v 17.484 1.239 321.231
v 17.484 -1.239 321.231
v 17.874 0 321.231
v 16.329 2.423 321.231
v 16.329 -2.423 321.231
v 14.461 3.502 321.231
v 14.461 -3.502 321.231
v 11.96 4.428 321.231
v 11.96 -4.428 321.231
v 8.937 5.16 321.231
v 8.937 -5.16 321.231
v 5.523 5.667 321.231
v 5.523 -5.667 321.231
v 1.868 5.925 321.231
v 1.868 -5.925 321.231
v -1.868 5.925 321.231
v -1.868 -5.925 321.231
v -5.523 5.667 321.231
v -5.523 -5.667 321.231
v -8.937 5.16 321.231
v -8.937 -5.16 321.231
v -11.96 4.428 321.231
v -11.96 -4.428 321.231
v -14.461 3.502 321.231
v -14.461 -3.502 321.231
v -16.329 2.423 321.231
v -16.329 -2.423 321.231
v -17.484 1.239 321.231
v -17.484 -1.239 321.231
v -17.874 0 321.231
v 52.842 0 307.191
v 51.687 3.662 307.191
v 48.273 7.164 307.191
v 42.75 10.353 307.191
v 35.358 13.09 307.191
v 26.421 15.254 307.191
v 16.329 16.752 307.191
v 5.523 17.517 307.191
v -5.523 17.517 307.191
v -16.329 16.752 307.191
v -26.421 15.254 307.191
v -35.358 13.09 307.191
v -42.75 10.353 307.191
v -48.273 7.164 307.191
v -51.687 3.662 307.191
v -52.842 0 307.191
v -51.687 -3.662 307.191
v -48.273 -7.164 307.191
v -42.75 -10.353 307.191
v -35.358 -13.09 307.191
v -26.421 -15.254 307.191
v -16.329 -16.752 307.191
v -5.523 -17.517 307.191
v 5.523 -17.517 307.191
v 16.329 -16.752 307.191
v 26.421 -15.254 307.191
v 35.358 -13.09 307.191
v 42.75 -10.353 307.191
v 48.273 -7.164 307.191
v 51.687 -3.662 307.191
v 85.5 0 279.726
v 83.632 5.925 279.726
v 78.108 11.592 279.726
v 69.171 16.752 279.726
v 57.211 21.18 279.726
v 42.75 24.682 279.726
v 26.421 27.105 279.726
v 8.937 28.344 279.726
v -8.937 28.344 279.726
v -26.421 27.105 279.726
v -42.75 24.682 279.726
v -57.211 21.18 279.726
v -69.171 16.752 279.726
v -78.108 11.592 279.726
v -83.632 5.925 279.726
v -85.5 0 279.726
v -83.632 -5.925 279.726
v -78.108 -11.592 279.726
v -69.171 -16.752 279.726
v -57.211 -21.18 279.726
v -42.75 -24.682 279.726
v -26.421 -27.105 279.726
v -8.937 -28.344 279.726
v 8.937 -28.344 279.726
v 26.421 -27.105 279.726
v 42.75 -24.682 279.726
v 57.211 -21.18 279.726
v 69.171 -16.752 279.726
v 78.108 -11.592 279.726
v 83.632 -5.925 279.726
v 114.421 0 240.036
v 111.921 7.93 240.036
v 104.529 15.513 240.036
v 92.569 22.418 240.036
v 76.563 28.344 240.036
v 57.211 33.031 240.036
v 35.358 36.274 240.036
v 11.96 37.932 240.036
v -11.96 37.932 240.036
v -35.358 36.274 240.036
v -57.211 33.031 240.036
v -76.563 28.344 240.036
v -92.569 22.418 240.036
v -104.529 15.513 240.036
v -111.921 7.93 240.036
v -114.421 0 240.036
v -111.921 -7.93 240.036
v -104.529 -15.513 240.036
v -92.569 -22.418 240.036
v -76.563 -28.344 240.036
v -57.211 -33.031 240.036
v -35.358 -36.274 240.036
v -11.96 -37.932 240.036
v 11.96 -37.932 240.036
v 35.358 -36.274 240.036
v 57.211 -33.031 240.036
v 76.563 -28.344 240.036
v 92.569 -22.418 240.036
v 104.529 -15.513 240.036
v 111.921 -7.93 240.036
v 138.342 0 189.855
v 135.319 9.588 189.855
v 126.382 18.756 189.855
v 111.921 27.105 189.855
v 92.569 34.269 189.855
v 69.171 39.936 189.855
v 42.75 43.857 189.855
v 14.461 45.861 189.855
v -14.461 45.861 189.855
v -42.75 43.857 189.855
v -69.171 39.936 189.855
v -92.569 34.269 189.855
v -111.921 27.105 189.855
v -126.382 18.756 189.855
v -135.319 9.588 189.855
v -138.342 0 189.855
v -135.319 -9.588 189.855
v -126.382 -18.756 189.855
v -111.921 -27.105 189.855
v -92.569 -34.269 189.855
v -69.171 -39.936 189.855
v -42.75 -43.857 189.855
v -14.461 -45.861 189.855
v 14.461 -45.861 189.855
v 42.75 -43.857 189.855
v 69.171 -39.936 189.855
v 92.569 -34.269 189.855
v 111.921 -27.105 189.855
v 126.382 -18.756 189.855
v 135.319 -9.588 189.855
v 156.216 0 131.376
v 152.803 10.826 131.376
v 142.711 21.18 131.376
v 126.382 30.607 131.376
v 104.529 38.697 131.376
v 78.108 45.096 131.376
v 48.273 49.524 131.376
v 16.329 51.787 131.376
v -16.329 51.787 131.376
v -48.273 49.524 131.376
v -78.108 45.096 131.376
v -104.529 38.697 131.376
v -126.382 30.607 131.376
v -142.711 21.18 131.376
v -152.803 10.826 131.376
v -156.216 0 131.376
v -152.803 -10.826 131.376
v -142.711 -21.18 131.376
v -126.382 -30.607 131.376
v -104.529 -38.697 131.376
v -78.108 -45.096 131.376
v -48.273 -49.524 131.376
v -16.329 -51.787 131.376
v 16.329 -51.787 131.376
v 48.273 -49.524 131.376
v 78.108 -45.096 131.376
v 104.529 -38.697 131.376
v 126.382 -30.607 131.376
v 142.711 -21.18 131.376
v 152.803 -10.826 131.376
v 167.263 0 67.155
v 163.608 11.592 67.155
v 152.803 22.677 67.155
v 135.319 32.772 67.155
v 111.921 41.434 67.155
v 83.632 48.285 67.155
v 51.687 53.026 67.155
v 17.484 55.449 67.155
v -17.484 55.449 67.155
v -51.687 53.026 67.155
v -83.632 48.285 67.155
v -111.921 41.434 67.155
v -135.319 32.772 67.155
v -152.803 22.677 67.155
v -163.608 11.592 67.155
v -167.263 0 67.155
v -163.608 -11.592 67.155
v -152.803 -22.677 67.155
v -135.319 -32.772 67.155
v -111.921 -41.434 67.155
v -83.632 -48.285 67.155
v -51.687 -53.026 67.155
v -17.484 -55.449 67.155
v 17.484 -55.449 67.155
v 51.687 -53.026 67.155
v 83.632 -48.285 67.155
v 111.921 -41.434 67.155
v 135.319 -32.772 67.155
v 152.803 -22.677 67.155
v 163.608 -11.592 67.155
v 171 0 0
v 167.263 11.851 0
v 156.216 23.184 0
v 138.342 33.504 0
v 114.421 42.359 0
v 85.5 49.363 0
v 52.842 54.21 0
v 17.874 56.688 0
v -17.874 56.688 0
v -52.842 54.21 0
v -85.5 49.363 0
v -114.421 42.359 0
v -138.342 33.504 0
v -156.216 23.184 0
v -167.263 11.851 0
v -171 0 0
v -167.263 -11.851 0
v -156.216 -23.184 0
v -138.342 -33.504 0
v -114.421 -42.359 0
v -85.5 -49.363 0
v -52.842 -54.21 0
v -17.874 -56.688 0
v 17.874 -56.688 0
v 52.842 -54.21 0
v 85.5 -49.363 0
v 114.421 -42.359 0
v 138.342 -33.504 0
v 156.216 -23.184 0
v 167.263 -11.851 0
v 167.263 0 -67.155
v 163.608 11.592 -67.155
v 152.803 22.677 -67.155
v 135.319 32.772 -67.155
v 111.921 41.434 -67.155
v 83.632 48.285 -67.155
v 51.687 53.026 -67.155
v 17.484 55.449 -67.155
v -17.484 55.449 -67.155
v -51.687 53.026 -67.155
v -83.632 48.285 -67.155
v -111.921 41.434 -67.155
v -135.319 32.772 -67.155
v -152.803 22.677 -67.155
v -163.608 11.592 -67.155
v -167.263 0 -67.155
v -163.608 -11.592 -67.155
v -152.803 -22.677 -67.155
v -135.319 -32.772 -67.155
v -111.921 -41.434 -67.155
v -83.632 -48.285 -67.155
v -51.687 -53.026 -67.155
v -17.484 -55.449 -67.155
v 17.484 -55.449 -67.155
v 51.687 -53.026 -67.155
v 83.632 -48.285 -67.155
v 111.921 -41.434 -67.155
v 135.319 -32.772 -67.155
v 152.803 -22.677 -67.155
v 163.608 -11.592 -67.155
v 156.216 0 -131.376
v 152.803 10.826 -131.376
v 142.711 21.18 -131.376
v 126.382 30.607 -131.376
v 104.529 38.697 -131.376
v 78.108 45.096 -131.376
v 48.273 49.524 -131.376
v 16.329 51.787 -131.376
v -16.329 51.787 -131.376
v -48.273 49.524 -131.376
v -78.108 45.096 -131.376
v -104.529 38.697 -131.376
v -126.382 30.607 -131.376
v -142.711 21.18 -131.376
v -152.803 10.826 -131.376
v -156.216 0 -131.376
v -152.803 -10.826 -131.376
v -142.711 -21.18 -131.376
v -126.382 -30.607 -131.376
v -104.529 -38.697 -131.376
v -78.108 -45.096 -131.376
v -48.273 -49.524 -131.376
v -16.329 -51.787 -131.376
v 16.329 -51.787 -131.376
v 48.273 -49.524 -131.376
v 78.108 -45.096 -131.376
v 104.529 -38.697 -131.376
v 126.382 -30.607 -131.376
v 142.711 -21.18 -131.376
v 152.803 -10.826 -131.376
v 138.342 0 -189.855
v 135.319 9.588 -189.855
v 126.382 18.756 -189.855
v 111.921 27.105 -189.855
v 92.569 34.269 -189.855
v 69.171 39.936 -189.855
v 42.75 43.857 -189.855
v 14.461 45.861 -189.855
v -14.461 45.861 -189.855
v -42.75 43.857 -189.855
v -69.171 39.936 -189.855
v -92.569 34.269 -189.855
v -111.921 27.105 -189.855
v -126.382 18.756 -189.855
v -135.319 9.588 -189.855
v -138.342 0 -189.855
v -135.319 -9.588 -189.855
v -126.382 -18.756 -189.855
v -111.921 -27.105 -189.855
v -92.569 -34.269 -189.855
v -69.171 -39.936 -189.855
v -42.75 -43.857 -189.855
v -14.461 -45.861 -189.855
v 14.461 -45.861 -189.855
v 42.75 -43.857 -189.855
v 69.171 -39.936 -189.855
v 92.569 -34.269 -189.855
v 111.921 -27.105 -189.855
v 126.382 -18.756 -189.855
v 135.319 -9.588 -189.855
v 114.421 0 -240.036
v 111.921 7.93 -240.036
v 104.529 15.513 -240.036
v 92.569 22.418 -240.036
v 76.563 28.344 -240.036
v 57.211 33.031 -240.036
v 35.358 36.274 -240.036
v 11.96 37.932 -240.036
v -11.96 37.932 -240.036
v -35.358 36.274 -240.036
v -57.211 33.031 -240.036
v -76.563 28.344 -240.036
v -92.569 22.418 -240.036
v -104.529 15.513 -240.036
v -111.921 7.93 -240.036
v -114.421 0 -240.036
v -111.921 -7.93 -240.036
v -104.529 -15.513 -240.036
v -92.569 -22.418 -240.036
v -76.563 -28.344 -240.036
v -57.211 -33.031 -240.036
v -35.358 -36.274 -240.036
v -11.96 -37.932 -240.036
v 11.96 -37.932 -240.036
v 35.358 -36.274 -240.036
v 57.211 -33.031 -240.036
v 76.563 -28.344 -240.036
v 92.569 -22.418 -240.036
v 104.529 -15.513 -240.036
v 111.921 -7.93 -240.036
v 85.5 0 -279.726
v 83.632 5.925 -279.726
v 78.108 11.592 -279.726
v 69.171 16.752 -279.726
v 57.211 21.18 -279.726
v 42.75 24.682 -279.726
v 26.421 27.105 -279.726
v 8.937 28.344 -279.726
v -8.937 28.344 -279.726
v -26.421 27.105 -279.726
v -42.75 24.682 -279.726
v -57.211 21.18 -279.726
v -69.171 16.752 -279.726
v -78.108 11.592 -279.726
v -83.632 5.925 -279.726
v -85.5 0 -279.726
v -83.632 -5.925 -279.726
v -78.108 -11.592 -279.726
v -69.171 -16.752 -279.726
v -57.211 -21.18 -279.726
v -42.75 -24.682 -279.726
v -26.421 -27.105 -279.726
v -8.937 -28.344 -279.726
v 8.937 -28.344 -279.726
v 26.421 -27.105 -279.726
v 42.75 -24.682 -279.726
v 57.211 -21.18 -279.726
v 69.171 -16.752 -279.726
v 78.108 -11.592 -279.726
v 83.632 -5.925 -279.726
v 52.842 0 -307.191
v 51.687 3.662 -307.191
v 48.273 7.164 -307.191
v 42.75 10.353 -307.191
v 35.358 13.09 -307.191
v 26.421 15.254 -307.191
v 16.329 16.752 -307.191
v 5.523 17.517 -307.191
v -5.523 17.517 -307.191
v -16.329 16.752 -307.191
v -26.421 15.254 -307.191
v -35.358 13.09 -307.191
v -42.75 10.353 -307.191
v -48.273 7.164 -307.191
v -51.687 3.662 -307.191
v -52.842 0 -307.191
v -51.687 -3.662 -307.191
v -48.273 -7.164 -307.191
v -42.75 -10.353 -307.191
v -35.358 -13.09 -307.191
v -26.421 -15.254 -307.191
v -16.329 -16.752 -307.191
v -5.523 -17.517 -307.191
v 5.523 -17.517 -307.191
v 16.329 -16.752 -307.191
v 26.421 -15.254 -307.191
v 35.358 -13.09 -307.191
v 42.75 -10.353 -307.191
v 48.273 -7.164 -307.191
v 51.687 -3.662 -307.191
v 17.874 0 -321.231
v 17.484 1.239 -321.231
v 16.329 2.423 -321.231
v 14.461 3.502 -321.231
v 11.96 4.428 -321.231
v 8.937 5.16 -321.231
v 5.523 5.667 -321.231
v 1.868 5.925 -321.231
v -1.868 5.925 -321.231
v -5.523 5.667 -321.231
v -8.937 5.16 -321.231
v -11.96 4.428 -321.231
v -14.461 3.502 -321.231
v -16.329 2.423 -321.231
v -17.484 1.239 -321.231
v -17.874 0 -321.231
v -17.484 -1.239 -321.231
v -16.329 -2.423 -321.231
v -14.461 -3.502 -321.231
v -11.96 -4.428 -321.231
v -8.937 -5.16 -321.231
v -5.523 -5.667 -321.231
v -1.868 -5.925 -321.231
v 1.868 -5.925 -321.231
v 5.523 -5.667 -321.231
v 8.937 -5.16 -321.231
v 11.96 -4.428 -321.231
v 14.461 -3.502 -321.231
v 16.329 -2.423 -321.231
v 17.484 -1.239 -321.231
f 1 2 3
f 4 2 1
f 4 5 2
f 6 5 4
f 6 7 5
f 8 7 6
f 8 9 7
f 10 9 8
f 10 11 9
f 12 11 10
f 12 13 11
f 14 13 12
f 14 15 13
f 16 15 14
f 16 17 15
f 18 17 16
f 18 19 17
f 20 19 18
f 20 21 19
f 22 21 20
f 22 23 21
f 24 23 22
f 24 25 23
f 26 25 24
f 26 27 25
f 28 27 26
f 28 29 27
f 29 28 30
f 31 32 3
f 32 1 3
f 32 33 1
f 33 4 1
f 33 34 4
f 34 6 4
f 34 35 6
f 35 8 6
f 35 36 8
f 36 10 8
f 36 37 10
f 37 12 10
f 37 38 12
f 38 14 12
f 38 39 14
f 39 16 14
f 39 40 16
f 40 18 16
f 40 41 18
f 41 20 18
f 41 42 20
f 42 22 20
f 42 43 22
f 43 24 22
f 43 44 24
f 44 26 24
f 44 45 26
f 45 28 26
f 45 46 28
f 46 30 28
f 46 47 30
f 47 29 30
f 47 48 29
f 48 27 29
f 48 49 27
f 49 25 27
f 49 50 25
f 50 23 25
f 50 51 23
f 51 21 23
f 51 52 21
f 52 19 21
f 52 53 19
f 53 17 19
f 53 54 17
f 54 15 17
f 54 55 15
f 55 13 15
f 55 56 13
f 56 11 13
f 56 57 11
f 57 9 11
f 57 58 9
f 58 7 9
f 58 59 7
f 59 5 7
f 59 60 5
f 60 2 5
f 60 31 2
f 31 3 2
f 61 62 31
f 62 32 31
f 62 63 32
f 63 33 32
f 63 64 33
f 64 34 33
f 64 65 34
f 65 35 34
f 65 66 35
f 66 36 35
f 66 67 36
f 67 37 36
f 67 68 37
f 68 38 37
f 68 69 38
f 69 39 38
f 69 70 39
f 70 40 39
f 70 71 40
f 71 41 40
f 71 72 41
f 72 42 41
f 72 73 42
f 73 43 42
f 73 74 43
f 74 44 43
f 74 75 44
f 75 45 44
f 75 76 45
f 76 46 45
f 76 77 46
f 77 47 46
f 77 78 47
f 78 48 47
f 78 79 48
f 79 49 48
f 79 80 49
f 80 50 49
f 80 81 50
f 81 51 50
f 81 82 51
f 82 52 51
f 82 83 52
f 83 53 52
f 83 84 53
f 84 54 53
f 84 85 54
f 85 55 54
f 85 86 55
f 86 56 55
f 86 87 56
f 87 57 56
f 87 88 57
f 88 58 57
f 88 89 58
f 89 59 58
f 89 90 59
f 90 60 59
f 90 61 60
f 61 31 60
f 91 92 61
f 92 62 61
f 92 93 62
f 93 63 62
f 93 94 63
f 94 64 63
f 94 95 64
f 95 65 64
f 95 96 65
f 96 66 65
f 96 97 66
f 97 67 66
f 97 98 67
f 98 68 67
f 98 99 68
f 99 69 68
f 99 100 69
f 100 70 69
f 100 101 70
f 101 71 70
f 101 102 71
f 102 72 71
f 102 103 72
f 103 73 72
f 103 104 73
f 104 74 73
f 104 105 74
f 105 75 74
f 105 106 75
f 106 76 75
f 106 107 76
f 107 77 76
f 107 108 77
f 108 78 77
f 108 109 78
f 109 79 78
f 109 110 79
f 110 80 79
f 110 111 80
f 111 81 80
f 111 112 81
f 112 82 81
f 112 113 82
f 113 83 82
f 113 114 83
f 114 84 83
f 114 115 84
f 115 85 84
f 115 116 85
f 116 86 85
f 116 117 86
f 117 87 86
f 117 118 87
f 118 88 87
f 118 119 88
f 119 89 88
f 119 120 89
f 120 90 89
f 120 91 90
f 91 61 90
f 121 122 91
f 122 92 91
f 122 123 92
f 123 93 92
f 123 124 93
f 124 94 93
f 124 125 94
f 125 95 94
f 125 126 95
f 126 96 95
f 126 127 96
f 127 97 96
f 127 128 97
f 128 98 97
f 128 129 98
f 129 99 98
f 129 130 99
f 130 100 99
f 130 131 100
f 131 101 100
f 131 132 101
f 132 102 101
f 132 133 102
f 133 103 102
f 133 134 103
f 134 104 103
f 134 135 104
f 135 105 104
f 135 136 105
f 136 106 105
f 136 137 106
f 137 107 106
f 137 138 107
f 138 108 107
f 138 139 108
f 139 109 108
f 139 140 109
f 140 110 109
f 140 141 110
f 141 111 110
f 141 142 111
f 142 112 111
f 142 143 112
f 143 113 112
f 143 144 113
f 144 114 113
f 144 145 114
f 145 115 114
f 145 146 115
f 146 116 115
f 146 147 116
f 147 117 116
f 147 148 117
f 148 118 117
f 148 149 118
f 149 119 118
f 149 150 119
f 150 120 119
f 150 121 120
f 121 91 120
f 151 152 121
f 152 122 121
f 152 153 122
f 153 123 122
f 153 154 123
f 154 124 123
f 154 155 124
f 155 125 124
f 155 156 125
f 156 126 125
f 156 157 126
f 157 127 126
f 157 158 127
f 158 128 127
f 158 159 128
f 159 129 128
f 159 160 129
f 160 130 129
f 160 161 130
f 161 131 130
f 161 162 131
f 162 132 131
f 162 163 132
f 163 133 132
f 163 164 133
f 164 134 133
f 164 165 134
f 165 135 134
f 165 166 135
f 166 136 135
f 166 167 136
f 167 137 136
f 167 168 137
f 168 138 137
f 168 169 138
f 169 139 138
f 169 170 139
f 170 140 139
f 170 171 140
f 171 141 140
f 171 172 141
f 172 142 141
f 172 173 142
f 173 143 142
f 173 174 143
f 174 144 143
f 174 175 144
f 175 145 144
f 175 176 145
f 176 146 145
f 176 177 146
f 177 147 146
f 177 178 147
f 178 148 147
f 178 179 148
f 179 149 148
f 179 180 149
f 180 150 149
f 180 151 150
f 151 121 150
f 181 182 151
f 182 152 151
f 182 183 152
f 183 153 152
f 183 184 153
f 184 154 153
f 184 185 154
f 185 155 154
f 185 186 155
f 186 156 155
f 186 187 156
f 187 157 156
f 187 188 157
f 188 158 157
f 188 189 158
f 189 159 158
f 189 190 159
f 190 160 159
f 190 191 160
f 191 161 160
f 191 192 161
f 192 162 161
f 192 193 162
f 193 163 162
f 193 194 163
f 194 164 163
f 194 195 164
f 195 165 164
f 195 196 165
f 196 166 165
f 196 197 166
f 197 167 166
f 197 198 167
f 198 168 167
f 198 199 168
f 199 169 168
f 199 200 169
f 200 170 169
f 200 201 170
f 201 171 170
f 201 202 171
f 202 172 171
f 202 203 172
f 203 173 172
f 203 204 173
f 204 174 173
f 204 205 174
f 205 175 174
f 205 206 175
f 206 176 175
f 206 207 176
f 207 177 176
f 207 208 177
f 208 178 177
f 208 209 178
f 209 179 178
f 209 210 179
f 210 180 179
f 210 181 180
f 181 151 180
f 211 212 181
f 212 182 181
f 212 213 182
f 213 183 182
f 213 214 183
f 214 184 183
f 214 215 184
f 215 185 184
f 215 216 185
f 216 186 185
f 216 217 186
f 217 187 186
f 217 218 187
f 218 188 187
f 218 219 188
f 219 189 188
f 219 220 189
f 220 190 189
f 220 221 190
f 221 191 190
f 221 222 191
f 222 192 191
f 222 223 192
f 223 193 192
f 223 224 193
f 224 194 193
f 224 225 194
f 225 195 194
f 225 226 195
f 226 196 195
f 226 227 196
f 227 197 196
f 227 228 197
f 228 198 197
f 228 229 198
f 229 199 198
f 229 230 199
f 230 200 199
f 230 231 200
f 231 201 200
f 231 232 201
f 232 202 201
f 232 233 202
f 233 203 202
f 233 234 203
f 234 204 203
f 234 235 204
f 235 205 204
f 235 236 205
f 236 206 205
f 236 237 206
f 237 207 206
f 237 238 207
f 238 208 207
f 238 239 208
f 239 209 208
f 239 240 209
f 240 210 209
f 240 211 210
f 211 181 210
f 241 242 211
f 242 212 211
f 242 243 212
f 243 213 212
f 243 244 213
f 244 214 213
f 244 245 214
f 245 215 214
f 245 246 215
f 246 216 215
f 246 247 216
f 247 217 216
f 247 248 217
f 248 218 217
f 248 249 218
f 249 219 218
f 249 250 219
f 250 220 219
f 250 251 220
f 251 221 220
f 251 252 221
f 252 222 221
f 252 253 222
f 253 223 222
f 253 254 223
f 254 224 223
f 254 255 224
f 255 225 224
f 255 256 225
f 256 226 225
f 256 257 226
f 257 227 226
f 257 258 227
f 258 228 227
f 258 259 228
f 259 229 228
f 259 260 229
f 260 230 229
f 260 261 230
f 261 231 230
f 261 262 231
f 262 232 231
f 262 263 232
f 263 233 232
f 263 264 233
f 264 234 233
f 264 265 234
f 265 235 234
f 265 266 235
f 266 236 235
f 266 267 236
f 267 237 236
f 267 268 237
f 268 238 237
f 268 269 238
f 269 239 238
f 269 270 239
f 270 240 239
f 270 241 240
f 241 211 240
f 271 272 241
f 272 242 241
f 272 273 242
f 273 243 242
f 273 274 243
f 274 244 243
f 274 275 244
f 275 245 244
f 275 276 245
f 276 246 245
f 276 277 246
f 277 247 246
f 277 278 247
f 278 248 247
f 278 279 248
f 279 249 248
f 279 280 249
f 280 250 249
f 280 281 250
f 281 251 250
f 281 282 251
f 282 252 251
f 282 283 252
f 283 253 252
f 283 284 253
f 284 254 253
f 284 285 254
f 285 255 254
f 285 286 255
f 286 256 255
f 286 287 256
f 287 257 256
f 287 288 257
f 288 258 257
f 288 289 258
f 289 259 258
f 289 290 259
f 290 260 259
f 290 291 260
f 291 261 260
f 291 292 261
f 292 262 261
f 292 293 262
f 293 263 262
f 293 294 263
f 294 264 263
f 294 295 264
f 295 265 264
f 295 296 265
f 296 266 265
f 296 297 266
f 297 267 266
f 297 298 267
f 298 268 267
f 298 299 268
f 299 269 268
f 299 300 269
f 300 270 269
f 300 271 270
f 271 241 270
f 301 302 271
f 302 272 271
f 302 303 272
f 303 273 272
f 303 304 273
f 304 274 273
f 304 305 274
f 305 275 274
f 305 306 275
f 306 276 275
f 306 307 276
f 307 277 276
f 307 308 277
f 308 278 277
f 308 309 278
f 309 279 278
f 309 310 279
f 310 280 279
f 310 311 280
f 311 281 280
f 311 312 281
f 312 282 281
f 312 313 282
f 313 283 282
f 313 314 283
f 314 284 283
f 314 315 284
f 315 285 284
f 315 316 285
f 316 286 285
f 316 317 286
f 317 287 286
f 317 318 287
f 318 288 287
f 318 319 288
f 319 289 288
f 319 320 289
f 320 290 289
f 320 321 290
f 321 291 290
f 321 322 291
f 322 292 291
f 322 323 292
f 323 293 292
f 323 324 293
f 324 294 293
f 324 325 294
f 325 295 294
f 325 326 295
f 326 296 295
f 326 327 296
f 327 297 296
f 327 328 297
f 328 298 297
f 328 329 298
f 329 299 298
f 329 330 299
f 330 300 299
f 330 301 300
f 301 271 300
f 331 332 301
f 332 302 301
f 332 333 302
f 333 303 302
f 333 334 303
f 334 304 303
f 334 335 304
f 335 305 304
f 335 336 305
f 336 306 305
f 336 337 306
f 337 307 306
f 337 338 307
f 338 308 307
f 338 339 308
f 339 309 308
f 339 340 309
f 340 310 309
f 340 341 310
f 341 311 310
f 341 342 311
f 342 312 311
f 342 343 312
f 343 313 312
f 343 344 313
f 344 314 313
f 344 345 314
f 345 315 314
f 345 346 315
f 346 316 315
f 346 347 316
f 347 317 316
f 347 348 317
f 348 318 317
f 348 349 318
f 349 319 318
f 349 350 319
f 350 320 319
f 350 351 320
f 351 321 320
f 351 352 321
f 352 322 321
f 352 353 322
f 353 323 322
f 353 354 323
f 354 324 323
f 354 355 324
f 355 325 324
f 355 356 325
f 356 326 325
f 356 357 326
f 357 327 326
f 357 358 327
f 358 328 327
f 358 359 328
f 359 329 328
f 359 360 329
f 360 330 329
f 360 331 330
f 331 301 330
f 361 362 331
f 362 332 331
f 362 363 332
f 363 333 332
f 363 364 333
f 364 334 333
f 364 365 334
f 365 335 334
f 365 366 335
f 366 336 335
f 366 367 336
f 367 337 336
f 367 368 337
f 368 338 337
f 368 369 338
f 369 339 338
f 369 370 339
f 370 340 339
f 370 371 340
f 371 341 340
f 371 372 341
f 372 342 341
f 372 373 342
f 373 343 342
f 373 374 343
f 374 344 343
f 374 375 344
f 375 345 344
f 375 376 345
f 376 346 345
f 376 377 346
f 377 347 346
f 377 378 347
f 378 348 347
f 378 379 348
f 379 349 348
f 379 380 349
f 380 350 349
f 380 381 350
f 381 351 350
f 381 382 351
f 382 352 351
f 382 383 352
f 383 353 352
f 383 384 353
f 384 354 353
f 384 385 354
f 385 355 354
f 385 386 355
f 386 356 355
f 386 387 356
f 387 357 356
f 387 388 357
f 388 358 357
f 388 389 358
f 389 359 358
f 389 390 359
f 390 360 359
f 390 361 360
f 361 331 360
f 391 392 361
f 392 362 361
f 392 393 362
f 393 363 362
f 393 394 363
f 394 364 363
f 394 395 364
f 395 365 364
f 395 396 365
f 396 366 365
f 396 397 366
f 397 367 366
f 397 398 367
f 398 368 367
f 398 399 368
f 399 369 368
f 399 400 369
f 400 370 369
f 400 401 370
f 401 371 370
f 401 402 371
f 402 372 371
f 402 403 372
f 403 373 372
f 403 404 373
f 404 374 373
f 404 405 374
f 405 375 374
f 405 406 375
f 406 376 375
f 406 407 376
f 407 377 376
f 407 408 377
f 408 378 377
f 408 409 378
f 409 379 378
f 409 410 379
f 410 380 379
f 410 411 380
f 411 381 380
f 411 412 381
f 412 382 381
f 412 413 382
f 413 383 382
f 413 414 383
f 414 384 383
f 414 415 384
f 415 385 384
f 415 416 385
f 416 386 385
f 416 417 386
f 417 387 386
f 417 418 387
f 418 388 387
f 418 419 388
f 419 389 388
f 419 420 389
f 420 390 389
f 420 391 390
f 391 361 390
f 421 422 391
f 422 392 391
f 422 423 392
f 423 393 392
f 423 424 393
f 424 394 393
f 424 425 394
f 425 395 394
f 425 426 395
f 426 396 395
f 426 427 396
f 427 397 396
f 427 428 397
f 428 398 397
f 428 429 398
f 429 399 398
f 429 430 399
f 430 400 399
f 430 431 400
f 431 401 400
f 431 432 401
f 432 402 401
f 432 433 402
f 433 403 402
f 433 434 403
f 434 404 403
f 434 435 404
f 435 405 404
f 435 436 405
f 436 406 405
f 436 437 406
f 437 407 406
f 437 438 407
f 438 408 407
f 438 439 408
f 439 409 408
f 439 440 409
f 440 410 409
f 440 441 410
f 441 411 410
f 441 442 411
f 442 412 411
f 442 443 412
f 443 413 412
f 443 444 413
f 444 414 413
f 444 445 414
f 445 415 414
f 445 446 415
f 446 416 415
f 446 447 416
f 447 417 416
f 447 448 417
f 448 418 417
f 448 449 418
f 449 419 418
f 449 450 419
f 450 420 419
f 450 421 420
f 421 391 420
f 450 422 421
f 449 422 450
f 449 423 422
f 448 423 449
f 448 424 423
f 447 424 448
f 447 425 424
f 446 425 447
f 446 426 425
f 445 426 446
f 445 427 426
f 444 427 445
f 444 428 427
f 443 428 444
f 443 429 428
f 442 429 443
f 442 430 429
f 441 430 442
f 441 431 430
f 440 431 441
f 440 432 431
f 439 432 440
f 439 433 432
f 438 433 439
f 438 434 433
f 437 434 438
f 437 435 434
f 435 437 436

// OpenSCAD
// Generated by SolidPython 1.0.1 on 2020-07-29 00:46:48


scale(v = [9, 3, 17]) {
	sphere(r = 19);
}
/***********************************************
*********      SolidPython code:      **********
************************************************
 
# import packages: SolidPython
from solid import *
from solid.utils import *
from itertools import chain, combinations, permutations


class Resize:

    def __init__(self, scad_file):
        self.scad_file = scad_file
        #self.scad_file = import_scad(scad_file)
        # cone/cylinder param:
        self.r1 = 0
        self.r2 = 0
        self.h = 0
        # rectangular prism param:
        self.w = 0
        self.l = 0
        # ellipse param:
        self.r = 0

    # import OpenScad code (file name corresponds to shape)


    # classify shape + parameters
    def assign(self, param1, param2, param3):
        if self.scad_file == 'cone.scad':
            self.r1 = param1
            self.r2 = param2
            self.h = param3
        elif self.scad_file == 'cylinder.scad':
            self.r1 = param1
            self.r2 = param2
            self.h = param3
        elif self.scad_file == 'rectangularPrism.scad':
            self.h = param1
            self.l = param2
            self.w = param3
        else:
            self.r = param1
            self.h = param2

    # resize parameters
    def iterate(self):
        x = range(3, 20, 2)
        i = 1
        if self.scad_file == 'cone.scad':
            tempList = list(permutations(x, 2))
            for temp in tempList:
                param1 = temp[0]
                param2 = temp[1]
                filepath = 'produced_scad_files/' + 'cone' + str(param1) + '_' + str(param2) + '_' + '.scad'
                scad_render_to_file(cylinder(h=param1, r1=param2, r2=0), filepath)

        elif self.scad_file == 'cylinder.scad':
            tempList = list(permutations(x, 3))
            for temp in tempList:
                param1 = temp[0]
                param2 = temp[1]
                filepath = 'produced_scad_files/' + 'cylinder' + str(param1) + '_' + str(param2) + '_' + '.scad'
                scad_render_to_file(cylinder(h=param1, r1=param2, r2=param2), filepath)

        elif self.scad_file == 'rectangularPrism.scad':
            tempList = list(permutations(x, 3))
            for temp in tempList:
                param1 = temp[0]
                param2 = temp[1]
                param3 = temp[2]
                filepath = 'produced_scad_files/' + 'rectangularPrism' + str(param1) + '_' + str(param2) + '_' + str(
                    param3) + '.scad'
                scad_render_to_file(cube(size=(param1, param2, param3)), filepath)

        elif self.scad_file == 'ellipse.scad':
            tempList = list(permutations(x, 4))
            for temp in tempList:
                param1 = temp[0]
                param2 = temp[1]
                param3 = temp[2]
                param4 = temp[3]
                filepath = 'produced_scad_files/' + 'ellipse' + str(param1) + '_' + str(param2) + '_' + str(param3) + '_' + str(param4) + '.scad'
                scad_render_to_file(scale([param1, param2, param3])(sphere(r=param4)), filepath)

    def render_to_scadfile(self):
        scad_render_to_file(scad, 'example.scad') 
 
************************************************/
